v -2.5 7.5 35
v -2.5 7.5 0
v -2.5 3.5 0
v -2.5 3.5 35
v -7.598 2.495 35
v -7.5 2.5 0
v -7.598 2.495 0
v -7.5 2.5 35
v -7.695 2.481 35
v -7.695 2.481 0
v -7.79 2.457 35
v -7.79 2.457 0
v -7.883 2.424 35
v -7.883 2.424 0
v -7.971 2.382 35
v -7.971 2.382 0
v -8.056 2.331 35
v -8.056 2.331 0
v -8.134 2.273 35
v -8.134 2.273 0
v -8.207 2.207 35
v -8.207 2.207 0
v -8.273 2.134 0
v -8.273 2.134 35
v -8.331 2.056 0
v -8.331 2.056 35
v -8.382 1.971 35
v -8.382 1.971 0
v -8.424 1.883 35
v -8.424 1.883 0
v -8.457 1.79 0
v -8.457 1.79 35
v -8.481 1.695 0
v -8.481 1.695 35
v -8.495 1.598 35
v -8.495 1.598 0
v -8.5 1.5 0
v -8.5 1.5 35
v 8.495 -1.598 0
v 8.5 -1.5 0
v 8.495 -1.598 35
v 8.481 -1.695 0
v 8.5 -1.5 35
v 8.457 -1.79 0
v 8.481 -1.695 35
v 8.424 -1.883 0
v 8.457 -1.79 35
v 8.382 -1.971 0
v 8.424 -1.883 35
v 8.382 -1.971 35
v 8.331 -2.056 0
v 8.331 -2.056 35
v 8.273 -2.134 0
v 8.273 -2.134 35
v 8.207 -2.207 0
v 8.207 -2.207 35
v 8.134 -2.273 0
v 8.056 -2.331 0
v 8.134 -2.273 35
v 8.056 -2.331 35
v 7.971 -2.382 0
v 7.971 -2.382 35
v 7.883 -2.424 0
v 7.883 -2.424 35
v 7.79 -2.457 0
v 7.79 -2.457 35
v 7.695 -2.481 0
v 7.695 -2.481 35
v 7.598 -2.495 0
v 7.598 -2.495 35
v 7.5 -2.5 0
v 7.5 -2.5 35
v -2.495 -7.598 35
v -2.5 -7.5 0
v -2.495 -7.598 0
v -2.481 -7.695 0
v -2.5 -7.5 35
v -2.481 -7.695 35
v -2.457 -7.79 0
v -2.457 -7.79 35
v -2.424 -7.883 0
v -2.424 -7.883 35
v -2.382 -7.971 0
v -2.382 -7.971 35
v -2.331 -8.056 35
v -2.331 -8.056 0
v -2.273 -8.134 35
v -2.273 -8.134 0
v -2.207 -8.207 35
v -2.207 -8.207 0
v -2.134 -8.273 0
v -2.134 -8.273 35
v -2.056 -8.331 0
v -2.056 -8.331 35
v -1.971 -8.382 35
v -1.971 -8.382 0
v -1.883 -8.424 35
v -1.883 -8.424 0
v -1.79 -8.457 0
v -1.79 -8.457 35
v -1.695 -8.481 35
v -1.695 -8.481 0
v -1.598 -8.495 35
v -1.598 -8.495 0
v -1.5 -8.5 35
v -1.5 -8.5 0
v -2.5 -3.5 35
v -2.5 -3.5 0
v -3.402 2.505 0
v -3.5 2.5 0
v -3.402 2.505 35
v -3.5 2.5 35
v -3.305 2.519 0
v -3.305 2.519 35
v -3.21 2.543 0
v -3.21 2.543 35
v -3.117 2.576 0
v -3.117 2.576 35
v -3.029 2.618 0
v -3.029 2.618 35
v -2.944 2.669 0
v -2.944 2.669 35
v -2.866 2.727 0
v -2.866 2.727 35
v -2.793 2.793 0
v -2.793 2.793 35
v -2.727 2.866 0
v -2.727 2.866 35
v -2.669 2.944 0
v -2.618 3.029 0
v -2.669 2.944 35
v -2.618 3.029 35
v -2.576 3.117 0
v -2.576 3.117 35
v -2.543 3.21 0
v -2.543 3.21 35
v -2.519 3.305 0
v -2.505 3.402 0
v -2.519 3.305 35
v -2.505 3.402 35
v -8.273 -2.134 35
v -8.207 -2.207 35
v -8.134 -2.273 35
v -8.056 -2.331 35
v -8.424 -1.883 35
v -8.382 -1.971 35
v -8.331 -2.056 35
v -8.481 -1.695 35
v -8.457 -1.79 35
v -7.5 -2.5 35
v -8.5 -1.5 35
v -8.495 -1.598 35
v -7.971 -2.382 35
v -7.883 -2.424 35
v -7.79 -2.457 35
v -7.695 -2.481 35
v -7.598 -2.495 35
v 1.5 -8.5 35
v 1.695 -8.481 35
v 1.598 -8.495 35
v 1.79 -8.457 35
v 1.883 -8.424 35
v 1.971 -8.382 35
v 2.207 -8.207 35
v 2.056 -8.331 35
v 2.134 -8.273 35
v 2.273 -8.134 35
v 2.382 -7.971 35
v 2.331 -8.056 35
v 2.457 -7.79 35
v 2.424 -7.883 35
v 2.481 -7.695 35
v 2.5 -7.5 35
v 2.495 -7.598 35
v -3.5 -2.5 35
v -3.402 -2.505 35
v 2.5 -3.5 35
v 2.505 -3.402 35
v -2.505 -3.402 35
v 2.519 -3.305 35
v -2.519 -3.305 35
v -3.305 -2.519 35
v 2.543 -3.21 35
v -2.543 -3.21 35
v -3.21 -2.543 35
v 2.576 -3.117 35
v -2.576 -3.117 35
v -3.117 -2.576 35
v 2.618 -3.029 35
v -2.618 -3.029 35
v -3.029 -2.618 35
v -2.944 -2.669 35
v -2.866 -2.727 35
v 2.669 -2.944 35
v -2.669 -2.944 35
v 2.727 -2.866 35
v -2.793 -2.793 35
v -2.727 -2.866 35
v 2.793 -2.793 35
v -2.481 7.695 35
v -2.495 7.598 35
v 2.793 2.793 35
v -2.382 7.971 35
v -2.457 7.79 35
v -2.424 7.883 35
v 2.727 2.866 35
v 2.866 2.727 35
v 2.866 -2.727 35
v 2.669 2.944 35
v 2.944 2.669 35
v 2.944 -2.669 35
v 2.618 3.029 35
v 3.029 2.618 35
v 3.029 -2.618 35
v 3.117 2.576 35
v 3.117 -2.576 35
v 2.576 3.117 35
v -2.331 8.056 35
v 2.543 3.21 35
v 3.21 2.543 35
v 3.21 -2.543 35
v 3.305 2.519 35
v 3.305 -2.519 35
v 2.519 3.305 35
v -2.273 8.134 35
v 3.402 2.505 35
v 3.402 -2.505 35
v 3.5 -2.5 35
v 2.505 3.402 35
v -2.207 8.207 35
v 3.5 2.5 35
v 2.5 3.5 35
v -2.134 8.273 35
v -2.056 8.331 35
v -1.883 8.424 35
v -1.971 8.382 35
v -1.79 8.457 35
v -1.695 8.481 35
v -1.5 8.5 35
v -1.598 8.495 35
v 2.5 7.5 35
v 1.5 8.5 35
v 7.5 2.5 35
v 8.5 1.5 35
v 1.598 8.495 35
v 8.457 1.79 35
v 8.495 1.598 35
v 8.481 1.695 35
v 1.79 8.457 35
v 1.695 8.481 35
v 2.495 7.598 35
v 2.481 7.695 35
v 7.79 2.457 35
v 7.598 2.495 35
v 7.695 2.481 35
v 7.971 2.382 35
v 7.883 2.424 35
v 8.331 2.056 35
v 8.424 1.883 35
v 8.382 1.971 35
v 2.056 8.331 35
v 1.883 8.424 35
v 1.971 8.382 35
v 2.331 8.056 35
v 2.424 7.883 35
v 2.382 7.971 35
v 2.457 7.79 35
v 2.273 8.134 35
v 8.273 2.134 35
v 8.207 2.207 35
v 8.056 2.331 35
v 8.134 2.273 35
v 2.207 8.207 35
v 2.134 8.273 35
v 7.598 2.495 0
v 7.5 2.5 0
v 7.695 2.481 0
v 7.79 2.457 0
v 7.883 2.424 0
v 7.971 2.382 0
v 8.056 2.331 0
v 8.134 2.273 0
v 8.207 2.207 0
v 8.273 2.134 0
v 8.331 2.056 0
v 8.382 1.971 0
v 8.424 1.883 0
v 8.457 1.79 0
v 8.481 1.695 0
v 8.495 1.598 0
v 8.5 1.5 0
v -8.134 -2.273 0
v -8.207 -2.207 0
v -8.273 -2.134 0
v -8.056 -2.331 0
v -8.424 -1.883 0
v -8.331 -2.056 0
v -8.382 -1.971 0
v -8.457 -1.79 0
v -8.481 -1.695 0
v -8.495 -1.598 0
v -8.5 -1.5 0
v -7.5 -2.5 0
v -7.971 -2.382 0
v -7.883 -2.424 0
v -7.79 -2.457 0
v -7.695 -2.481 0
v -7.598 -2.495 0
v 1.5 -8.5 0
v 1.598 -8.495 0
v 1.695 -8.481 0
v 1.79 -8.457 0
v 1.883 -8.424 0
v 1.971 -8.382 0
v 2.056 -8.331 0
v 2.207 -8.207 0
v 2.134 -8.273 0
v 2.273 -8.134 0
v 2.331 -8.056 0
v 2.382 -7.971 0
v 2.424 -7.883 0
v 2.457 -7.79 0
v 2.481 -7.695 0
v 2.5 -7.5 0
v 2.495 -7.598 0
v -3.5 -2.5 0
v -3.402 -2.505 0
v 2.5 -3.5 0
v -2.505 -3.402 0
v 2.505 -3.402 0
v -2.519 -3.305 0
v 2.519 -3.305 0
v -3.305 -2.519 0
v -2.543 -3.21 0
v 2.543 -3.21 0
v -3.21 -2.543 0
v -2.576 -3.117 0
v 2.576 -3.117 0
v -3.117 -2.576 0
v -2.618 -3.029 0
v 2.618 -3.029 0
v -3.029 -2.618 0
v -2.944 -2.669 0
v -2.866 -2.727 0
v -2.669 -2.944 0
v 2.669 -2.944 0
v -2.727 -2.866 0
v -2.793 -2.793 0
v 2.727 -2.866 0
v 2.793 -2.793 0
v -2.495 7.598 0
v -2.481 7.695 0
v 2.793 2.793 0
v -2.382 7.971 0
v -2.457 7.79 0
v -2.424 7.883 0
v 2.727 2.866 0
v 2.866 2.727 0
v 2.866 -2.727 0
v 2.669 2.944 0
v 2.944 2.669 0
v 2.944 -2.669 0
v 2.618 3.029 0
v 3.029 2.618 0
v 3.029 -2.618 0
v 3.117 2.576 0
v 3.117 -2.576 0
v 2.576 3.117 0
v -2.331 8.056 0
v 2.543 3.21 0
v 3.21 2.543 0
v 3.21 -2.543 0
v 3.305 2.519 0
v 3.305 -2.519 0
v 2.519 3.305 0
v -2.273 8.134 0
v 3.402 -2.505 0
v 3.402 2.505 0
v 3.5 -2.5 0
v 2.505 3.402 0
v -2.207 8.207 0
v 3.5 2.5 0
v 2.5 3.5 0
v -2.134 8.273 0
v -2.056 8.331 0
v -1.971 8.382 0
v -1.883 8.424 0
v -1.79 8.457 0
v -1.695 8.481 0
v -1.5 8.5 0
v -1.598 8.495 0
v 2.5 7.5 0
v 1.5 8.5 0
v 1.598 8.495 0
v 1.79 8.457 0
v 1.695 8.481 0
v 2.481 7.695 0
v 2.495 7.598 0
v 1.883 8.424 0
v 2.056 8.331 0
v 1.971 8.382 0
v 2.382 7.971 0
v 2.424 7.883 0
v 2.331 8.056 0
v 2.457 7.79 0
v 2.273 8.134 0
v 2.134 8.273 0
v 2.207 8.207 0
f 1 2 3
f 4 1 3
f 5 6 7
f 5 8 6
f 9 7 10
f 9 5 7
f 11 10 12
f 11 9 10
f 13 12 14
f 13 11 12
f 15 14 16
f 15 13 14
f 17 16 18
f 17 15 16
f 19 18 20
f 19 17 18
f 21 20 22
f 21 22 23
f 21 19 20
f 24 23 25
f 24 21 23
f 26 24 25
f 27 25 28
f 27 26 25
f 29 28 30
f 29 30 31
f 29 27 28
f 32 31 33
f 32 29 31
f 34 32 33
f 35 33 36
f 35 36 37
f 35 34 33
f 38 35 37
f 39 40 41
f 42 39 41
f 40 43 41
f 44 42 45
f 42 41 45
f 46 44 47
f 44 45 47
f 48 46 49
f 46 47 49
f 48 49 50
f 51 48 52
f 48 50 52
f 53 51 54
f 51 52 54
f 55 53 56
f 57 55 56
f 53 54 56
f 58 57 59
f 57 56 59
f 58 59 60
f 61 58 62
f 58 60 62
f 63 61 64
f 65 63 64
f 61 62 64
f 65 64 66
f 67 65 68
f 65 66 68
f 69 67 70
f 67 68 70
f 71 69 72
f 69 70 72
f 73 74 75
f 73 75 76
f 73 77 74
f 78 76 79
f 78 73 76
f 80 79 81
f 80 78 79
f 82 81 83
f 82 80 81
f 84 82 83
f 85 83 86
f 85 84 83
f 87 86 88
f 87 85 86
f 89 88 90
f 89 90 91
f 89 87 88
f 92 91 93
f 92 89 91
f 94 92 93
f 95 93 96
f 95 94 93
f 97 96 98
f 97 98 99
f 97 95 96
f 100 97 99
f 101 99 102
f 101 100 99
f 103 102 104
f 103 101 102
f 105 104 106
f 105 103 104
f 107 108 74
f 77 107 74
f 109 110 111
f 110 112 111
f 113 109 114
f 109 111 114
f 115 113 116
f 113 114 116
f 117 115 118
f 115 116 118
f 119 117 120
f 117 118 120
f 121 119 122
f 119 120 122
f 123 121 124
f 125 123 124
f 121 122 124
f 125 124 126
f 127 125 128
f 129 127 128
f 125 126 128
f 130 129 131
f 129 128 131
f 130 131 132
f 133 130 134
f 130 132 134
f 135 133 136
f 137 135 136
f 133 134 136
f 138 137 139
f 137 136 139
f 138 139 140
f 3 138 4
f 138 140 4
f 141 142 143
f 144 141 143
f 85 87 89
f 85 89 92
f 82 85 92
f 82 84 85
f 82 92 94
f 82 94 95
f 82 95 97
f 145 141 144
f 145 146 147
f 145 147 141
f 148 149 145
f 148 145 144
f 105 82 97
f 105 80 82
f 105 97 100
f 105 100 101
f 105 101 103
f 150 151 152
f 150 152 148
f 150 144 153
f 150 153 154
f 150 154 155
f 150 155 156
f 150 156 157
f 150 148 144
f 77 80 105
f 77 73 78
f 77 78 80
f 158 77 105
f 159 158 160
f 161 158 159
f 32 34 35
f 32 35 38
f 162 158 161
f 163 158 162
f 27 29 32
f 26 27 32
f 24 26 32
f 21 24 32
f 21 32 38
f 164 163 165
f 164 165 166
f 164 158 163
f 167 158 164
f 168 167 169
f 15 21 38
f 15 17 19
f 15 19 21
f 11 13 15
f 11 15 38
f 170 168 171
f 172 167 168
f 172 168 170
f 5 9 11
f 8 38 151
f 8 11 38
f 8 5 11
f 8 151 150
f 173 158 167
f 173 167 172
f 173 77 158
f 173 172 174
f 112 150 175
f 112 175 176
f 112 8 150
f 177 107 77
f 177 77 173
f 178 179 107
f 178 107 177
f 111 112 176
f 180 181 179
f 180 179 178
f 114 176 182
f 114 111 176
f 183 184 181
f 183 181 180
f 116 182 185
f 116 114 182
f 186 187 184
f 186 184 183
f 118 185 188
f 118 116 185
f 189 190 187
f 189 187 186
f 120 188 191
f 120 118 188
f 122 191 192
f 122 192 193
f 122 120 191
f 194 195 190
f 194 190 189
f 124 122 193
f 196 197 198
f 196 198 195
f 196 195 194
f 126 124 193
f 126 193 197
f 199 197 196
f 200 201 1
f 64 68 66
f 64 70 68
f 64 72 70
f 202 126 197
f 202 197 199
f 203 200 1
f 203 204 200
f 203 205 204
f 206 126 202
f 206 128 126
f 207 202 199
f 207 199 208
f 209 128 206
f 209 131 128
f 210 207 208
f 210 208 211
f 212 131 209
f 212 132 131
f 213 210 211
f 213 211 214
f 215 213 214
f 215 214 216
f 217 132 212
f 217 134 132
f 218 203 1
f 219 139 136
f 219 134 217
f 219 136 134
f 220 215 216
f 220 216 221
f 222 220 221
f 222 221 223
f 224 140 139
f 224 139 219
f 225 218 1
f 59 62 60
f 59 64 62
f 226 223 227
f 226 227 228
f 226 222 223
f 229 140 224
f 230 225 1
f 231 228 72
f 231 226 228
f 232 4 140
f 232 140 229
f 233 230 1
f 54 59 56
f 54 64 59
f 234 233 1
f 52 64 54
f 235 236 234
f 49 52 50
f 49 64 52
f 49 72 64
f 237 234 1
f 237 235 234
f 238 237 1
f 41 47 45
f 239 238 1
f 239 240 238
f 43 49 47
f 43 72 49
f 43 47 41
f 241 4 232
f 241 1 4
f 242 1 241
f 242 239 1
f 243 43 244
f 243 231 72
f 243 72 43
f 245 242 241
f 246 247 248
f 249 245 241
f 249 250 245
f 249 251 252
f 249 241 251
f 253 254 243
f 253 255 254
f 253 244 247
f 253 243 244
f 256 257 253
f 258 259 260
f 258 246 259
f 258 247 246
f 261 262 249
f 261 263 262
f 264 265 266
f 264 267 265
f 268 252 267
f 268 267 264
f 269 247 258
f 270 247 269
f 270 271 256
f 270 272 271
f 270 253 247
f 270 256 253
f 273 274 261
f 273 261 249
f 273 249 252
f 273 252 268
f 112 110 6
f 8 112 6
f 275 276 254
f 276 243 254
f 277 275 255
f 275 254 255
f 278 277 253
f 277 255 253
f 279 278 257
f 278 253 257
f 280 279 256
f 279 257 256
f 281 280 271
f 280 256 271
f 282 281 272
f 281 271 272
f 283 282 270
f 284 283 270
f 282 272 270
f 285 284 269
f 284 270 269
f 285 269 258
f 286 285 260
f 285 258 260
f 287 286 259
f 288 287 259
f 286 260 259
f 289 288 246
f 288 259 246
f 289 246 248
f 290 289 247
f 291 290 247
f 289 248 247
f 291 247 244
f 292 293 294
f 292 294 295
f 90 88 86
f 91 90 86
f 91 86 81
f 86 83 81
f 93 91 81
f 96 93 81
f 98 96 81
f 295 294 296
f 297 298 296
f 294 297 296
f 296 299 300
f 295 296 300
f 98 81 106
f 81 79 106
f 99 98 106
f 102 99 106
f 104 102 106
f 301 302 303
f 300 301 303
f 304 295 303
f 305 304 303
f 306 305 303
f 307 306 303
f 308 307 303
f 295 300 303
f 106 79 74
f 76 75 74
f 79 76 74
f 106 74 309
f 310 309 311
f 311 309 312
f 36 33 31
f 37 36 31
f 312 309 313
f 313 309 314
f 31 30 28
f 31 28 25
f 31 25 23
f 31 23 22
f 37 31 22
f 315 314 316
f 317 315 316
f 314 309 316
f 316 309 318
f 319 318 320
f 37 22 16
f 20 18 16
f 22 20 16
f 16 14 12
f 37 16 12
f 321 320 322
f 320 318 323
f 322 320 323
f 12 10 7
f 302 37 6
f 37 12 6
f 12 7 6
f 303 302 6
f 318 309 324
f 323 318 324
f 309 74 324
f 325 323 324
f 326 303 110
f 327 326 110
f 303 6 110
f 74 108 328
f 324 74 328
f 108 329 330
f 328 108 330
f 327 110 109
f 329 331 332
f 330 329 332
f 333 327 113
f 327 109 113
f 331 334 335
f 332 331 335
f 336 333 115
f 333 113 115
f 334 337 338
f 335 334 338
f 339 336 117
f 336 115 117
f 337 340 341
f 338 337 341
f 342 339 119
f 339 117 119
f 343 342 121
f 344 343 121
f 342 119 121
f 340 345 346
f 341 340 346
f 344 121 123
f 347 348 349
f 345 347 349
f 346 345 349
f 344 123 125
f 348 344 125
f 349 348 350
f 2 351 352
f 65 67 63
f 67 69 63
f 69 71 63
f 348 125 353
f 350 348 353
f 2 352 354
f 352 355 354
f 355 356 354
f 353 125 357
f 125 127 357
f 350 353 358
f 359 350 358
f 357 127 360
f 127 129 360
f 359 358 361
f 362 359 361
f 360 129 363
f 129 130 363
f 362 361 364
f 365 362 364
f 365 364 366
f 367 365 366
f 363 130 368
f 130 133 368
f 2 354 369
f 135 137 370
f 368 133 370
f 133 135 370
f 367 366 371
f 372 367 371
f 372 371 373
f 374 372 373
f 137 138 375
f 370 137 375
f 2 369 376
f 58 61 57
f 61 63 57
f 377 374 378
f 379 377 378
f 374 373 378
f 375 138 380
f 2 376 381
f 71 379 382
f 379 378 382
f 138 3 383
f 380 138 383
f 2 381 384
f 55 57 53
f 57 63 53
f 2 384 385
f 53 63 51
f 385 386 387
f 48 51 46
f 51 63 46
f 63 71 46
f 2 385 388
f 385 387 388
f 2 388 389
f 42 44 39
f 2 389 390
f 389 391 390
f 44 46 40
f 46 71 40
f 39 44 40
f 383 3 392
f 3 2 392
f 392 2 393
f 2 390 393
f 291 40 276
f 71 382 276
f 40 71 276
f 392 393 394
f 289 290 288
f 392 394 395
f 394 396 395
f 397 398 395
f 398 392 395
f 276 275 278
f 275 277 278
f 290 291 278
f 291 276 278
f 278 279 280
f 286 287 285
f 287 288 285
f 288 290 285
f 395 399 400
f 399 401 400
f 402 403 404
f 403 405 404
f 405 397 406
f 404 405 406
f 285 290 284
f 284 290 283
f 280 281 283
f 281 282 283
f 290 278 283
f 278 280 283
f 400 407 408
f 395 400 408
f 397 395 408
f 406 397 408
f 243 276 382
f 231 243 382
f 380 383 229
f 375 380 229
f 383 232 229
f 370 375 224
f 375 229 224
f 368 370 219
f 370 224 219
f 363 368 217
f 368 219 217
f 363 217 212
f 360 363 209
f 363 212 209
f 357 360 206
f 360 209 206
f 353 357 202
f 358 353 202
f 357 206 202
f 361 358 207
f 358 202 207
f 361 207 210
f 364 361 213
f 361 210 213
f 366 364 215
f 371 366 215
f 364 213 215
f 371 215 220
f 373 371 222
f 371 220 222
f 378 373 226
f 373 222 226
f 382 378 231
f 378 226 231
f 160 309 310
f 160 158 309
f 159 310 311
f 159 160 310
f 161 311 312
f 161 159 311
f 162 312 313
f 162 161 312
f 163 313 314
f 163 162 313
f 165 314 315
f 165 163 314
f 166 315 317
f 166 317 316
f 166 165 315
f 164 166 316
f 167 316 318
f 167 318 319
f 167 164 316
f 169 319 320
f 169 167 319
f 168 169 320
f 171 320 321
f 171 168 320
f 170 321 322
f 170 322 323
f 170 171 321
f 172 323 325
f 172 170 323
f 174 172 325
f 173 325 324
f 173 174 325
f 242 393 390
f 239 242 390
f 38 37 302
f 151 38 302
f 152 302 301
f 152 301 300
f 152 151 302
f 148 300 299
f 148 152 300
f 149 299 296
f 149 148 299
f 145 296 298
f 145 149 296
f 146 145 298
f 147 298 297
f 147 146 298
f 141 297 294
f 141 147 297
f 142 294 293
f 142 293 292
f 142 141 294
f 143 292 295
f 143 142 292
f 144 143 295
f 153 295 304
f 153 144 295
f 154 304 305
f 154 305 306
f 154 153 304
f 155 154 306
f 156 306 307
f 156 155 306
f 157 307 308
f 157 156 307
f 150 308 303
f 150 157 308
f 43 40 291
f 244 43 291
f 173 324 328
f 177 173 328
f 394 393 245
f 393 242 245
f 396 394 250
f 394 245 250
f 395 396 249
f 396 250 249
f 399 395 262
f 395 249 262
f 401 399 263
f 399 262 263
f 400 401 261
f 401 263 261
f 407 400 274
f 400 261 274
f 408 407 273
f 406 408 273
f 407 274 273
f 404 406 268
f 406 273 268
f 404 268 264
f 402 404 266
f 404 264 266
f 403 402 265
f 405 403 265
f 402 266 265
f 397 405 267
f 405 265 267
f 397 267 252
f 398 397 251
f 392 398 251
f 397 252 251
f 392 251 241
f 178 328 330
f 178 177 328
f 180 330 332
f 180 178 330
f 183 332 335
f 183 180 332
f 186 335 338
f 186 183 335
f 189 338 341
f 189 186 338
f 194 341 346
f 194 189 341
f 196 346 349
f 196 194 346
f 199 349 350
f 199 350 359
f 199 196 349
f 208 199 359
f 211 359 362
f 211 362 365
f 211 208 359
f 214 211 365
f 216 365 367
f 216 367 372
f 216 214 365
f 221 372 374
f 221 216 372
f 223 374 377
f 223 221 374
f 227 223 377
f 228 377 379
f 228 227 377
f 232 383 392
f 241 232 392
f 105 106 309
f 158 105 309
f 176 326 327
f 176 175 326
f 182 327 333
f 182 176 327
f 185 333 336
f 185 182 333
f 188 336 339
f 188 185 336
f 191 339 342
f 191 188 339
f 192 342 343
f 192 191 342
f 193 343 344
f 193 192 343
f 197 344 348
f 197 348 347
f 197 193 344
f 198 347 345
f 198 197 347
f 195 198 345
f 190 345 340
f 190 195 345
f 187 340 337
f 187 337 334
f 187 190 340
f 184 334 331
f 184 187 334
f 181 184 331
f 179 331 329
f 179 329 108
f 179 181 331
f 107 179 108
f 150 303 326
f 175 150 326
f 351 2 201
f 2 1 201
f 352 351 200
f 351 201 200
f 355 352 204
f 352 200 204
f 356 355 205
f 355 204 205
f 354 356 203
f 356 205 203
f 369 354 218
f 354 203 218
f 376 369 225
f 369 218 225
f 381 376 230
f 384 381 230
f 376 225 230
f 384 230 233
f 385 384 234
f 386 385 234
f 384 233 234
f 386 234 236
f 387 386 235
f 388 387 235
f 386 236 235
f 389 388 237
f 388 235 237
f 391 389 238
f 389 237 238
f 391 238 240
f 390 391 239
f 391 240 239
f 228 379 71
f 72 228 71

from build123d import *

# Parameters (mm, degrees)
F1_DEPTH = 35
F2_R     = 1
F3_R     = 1
F4_R     = 1


with BuildPart() as f1:
    # F0 (on Top) → F1 (new body)
    with BuildSketch(Plane.XY):
        Polygon((-8.5, -2.5), (-2.5, -2.5), (-2.5, -8.5), (2.5, -8.5), (2.5, -2.5), (8.5, -2.5), (8.5, 2.5), (2.5, 2.5), (2.5, 8.5), (-2.5, 8.5), (-2.5, 2.5), (-8.5, 2.5), align=None)
    extrude(amount=F1_DEPTH)

    # F2
    f2_edges = [f1.edges().sort_by_distance(p)[0] for p in [
        (2.5, -2.5, 17.5),
        (-2.5, -2.5, 17.5),
    ]]
    fillet(f2_edges, radius=F2_R)

    # F3
    f3_edges = [f1.edges().sort_by_distance(p)[0] for p in [
        (-2.5, 2.5, 17.5),
        (2.5, 2.5, 17.5),
    ]]
    fillet(f3_edges, radius=F3_R)

    # F4
    f4_edges = [f1.edges().sort_by_distance(p)[0] for p in [
        (-2.5, -8.5, 17.5),
        (2.5, -8.5, 17.5),
        (-8.5, -2.5, 17.5),
        (-8.5, 2.5, 17.5),
        (-2.5, 8.5, 17.5),
        (2.5, 8.5, 17.5),
        (8.5, 2.5, 17.5),
        (8.5, -2.5, 17.5),
    ]]
    fillet(f4_edges, radius=F4_R)


solid = f1.part
